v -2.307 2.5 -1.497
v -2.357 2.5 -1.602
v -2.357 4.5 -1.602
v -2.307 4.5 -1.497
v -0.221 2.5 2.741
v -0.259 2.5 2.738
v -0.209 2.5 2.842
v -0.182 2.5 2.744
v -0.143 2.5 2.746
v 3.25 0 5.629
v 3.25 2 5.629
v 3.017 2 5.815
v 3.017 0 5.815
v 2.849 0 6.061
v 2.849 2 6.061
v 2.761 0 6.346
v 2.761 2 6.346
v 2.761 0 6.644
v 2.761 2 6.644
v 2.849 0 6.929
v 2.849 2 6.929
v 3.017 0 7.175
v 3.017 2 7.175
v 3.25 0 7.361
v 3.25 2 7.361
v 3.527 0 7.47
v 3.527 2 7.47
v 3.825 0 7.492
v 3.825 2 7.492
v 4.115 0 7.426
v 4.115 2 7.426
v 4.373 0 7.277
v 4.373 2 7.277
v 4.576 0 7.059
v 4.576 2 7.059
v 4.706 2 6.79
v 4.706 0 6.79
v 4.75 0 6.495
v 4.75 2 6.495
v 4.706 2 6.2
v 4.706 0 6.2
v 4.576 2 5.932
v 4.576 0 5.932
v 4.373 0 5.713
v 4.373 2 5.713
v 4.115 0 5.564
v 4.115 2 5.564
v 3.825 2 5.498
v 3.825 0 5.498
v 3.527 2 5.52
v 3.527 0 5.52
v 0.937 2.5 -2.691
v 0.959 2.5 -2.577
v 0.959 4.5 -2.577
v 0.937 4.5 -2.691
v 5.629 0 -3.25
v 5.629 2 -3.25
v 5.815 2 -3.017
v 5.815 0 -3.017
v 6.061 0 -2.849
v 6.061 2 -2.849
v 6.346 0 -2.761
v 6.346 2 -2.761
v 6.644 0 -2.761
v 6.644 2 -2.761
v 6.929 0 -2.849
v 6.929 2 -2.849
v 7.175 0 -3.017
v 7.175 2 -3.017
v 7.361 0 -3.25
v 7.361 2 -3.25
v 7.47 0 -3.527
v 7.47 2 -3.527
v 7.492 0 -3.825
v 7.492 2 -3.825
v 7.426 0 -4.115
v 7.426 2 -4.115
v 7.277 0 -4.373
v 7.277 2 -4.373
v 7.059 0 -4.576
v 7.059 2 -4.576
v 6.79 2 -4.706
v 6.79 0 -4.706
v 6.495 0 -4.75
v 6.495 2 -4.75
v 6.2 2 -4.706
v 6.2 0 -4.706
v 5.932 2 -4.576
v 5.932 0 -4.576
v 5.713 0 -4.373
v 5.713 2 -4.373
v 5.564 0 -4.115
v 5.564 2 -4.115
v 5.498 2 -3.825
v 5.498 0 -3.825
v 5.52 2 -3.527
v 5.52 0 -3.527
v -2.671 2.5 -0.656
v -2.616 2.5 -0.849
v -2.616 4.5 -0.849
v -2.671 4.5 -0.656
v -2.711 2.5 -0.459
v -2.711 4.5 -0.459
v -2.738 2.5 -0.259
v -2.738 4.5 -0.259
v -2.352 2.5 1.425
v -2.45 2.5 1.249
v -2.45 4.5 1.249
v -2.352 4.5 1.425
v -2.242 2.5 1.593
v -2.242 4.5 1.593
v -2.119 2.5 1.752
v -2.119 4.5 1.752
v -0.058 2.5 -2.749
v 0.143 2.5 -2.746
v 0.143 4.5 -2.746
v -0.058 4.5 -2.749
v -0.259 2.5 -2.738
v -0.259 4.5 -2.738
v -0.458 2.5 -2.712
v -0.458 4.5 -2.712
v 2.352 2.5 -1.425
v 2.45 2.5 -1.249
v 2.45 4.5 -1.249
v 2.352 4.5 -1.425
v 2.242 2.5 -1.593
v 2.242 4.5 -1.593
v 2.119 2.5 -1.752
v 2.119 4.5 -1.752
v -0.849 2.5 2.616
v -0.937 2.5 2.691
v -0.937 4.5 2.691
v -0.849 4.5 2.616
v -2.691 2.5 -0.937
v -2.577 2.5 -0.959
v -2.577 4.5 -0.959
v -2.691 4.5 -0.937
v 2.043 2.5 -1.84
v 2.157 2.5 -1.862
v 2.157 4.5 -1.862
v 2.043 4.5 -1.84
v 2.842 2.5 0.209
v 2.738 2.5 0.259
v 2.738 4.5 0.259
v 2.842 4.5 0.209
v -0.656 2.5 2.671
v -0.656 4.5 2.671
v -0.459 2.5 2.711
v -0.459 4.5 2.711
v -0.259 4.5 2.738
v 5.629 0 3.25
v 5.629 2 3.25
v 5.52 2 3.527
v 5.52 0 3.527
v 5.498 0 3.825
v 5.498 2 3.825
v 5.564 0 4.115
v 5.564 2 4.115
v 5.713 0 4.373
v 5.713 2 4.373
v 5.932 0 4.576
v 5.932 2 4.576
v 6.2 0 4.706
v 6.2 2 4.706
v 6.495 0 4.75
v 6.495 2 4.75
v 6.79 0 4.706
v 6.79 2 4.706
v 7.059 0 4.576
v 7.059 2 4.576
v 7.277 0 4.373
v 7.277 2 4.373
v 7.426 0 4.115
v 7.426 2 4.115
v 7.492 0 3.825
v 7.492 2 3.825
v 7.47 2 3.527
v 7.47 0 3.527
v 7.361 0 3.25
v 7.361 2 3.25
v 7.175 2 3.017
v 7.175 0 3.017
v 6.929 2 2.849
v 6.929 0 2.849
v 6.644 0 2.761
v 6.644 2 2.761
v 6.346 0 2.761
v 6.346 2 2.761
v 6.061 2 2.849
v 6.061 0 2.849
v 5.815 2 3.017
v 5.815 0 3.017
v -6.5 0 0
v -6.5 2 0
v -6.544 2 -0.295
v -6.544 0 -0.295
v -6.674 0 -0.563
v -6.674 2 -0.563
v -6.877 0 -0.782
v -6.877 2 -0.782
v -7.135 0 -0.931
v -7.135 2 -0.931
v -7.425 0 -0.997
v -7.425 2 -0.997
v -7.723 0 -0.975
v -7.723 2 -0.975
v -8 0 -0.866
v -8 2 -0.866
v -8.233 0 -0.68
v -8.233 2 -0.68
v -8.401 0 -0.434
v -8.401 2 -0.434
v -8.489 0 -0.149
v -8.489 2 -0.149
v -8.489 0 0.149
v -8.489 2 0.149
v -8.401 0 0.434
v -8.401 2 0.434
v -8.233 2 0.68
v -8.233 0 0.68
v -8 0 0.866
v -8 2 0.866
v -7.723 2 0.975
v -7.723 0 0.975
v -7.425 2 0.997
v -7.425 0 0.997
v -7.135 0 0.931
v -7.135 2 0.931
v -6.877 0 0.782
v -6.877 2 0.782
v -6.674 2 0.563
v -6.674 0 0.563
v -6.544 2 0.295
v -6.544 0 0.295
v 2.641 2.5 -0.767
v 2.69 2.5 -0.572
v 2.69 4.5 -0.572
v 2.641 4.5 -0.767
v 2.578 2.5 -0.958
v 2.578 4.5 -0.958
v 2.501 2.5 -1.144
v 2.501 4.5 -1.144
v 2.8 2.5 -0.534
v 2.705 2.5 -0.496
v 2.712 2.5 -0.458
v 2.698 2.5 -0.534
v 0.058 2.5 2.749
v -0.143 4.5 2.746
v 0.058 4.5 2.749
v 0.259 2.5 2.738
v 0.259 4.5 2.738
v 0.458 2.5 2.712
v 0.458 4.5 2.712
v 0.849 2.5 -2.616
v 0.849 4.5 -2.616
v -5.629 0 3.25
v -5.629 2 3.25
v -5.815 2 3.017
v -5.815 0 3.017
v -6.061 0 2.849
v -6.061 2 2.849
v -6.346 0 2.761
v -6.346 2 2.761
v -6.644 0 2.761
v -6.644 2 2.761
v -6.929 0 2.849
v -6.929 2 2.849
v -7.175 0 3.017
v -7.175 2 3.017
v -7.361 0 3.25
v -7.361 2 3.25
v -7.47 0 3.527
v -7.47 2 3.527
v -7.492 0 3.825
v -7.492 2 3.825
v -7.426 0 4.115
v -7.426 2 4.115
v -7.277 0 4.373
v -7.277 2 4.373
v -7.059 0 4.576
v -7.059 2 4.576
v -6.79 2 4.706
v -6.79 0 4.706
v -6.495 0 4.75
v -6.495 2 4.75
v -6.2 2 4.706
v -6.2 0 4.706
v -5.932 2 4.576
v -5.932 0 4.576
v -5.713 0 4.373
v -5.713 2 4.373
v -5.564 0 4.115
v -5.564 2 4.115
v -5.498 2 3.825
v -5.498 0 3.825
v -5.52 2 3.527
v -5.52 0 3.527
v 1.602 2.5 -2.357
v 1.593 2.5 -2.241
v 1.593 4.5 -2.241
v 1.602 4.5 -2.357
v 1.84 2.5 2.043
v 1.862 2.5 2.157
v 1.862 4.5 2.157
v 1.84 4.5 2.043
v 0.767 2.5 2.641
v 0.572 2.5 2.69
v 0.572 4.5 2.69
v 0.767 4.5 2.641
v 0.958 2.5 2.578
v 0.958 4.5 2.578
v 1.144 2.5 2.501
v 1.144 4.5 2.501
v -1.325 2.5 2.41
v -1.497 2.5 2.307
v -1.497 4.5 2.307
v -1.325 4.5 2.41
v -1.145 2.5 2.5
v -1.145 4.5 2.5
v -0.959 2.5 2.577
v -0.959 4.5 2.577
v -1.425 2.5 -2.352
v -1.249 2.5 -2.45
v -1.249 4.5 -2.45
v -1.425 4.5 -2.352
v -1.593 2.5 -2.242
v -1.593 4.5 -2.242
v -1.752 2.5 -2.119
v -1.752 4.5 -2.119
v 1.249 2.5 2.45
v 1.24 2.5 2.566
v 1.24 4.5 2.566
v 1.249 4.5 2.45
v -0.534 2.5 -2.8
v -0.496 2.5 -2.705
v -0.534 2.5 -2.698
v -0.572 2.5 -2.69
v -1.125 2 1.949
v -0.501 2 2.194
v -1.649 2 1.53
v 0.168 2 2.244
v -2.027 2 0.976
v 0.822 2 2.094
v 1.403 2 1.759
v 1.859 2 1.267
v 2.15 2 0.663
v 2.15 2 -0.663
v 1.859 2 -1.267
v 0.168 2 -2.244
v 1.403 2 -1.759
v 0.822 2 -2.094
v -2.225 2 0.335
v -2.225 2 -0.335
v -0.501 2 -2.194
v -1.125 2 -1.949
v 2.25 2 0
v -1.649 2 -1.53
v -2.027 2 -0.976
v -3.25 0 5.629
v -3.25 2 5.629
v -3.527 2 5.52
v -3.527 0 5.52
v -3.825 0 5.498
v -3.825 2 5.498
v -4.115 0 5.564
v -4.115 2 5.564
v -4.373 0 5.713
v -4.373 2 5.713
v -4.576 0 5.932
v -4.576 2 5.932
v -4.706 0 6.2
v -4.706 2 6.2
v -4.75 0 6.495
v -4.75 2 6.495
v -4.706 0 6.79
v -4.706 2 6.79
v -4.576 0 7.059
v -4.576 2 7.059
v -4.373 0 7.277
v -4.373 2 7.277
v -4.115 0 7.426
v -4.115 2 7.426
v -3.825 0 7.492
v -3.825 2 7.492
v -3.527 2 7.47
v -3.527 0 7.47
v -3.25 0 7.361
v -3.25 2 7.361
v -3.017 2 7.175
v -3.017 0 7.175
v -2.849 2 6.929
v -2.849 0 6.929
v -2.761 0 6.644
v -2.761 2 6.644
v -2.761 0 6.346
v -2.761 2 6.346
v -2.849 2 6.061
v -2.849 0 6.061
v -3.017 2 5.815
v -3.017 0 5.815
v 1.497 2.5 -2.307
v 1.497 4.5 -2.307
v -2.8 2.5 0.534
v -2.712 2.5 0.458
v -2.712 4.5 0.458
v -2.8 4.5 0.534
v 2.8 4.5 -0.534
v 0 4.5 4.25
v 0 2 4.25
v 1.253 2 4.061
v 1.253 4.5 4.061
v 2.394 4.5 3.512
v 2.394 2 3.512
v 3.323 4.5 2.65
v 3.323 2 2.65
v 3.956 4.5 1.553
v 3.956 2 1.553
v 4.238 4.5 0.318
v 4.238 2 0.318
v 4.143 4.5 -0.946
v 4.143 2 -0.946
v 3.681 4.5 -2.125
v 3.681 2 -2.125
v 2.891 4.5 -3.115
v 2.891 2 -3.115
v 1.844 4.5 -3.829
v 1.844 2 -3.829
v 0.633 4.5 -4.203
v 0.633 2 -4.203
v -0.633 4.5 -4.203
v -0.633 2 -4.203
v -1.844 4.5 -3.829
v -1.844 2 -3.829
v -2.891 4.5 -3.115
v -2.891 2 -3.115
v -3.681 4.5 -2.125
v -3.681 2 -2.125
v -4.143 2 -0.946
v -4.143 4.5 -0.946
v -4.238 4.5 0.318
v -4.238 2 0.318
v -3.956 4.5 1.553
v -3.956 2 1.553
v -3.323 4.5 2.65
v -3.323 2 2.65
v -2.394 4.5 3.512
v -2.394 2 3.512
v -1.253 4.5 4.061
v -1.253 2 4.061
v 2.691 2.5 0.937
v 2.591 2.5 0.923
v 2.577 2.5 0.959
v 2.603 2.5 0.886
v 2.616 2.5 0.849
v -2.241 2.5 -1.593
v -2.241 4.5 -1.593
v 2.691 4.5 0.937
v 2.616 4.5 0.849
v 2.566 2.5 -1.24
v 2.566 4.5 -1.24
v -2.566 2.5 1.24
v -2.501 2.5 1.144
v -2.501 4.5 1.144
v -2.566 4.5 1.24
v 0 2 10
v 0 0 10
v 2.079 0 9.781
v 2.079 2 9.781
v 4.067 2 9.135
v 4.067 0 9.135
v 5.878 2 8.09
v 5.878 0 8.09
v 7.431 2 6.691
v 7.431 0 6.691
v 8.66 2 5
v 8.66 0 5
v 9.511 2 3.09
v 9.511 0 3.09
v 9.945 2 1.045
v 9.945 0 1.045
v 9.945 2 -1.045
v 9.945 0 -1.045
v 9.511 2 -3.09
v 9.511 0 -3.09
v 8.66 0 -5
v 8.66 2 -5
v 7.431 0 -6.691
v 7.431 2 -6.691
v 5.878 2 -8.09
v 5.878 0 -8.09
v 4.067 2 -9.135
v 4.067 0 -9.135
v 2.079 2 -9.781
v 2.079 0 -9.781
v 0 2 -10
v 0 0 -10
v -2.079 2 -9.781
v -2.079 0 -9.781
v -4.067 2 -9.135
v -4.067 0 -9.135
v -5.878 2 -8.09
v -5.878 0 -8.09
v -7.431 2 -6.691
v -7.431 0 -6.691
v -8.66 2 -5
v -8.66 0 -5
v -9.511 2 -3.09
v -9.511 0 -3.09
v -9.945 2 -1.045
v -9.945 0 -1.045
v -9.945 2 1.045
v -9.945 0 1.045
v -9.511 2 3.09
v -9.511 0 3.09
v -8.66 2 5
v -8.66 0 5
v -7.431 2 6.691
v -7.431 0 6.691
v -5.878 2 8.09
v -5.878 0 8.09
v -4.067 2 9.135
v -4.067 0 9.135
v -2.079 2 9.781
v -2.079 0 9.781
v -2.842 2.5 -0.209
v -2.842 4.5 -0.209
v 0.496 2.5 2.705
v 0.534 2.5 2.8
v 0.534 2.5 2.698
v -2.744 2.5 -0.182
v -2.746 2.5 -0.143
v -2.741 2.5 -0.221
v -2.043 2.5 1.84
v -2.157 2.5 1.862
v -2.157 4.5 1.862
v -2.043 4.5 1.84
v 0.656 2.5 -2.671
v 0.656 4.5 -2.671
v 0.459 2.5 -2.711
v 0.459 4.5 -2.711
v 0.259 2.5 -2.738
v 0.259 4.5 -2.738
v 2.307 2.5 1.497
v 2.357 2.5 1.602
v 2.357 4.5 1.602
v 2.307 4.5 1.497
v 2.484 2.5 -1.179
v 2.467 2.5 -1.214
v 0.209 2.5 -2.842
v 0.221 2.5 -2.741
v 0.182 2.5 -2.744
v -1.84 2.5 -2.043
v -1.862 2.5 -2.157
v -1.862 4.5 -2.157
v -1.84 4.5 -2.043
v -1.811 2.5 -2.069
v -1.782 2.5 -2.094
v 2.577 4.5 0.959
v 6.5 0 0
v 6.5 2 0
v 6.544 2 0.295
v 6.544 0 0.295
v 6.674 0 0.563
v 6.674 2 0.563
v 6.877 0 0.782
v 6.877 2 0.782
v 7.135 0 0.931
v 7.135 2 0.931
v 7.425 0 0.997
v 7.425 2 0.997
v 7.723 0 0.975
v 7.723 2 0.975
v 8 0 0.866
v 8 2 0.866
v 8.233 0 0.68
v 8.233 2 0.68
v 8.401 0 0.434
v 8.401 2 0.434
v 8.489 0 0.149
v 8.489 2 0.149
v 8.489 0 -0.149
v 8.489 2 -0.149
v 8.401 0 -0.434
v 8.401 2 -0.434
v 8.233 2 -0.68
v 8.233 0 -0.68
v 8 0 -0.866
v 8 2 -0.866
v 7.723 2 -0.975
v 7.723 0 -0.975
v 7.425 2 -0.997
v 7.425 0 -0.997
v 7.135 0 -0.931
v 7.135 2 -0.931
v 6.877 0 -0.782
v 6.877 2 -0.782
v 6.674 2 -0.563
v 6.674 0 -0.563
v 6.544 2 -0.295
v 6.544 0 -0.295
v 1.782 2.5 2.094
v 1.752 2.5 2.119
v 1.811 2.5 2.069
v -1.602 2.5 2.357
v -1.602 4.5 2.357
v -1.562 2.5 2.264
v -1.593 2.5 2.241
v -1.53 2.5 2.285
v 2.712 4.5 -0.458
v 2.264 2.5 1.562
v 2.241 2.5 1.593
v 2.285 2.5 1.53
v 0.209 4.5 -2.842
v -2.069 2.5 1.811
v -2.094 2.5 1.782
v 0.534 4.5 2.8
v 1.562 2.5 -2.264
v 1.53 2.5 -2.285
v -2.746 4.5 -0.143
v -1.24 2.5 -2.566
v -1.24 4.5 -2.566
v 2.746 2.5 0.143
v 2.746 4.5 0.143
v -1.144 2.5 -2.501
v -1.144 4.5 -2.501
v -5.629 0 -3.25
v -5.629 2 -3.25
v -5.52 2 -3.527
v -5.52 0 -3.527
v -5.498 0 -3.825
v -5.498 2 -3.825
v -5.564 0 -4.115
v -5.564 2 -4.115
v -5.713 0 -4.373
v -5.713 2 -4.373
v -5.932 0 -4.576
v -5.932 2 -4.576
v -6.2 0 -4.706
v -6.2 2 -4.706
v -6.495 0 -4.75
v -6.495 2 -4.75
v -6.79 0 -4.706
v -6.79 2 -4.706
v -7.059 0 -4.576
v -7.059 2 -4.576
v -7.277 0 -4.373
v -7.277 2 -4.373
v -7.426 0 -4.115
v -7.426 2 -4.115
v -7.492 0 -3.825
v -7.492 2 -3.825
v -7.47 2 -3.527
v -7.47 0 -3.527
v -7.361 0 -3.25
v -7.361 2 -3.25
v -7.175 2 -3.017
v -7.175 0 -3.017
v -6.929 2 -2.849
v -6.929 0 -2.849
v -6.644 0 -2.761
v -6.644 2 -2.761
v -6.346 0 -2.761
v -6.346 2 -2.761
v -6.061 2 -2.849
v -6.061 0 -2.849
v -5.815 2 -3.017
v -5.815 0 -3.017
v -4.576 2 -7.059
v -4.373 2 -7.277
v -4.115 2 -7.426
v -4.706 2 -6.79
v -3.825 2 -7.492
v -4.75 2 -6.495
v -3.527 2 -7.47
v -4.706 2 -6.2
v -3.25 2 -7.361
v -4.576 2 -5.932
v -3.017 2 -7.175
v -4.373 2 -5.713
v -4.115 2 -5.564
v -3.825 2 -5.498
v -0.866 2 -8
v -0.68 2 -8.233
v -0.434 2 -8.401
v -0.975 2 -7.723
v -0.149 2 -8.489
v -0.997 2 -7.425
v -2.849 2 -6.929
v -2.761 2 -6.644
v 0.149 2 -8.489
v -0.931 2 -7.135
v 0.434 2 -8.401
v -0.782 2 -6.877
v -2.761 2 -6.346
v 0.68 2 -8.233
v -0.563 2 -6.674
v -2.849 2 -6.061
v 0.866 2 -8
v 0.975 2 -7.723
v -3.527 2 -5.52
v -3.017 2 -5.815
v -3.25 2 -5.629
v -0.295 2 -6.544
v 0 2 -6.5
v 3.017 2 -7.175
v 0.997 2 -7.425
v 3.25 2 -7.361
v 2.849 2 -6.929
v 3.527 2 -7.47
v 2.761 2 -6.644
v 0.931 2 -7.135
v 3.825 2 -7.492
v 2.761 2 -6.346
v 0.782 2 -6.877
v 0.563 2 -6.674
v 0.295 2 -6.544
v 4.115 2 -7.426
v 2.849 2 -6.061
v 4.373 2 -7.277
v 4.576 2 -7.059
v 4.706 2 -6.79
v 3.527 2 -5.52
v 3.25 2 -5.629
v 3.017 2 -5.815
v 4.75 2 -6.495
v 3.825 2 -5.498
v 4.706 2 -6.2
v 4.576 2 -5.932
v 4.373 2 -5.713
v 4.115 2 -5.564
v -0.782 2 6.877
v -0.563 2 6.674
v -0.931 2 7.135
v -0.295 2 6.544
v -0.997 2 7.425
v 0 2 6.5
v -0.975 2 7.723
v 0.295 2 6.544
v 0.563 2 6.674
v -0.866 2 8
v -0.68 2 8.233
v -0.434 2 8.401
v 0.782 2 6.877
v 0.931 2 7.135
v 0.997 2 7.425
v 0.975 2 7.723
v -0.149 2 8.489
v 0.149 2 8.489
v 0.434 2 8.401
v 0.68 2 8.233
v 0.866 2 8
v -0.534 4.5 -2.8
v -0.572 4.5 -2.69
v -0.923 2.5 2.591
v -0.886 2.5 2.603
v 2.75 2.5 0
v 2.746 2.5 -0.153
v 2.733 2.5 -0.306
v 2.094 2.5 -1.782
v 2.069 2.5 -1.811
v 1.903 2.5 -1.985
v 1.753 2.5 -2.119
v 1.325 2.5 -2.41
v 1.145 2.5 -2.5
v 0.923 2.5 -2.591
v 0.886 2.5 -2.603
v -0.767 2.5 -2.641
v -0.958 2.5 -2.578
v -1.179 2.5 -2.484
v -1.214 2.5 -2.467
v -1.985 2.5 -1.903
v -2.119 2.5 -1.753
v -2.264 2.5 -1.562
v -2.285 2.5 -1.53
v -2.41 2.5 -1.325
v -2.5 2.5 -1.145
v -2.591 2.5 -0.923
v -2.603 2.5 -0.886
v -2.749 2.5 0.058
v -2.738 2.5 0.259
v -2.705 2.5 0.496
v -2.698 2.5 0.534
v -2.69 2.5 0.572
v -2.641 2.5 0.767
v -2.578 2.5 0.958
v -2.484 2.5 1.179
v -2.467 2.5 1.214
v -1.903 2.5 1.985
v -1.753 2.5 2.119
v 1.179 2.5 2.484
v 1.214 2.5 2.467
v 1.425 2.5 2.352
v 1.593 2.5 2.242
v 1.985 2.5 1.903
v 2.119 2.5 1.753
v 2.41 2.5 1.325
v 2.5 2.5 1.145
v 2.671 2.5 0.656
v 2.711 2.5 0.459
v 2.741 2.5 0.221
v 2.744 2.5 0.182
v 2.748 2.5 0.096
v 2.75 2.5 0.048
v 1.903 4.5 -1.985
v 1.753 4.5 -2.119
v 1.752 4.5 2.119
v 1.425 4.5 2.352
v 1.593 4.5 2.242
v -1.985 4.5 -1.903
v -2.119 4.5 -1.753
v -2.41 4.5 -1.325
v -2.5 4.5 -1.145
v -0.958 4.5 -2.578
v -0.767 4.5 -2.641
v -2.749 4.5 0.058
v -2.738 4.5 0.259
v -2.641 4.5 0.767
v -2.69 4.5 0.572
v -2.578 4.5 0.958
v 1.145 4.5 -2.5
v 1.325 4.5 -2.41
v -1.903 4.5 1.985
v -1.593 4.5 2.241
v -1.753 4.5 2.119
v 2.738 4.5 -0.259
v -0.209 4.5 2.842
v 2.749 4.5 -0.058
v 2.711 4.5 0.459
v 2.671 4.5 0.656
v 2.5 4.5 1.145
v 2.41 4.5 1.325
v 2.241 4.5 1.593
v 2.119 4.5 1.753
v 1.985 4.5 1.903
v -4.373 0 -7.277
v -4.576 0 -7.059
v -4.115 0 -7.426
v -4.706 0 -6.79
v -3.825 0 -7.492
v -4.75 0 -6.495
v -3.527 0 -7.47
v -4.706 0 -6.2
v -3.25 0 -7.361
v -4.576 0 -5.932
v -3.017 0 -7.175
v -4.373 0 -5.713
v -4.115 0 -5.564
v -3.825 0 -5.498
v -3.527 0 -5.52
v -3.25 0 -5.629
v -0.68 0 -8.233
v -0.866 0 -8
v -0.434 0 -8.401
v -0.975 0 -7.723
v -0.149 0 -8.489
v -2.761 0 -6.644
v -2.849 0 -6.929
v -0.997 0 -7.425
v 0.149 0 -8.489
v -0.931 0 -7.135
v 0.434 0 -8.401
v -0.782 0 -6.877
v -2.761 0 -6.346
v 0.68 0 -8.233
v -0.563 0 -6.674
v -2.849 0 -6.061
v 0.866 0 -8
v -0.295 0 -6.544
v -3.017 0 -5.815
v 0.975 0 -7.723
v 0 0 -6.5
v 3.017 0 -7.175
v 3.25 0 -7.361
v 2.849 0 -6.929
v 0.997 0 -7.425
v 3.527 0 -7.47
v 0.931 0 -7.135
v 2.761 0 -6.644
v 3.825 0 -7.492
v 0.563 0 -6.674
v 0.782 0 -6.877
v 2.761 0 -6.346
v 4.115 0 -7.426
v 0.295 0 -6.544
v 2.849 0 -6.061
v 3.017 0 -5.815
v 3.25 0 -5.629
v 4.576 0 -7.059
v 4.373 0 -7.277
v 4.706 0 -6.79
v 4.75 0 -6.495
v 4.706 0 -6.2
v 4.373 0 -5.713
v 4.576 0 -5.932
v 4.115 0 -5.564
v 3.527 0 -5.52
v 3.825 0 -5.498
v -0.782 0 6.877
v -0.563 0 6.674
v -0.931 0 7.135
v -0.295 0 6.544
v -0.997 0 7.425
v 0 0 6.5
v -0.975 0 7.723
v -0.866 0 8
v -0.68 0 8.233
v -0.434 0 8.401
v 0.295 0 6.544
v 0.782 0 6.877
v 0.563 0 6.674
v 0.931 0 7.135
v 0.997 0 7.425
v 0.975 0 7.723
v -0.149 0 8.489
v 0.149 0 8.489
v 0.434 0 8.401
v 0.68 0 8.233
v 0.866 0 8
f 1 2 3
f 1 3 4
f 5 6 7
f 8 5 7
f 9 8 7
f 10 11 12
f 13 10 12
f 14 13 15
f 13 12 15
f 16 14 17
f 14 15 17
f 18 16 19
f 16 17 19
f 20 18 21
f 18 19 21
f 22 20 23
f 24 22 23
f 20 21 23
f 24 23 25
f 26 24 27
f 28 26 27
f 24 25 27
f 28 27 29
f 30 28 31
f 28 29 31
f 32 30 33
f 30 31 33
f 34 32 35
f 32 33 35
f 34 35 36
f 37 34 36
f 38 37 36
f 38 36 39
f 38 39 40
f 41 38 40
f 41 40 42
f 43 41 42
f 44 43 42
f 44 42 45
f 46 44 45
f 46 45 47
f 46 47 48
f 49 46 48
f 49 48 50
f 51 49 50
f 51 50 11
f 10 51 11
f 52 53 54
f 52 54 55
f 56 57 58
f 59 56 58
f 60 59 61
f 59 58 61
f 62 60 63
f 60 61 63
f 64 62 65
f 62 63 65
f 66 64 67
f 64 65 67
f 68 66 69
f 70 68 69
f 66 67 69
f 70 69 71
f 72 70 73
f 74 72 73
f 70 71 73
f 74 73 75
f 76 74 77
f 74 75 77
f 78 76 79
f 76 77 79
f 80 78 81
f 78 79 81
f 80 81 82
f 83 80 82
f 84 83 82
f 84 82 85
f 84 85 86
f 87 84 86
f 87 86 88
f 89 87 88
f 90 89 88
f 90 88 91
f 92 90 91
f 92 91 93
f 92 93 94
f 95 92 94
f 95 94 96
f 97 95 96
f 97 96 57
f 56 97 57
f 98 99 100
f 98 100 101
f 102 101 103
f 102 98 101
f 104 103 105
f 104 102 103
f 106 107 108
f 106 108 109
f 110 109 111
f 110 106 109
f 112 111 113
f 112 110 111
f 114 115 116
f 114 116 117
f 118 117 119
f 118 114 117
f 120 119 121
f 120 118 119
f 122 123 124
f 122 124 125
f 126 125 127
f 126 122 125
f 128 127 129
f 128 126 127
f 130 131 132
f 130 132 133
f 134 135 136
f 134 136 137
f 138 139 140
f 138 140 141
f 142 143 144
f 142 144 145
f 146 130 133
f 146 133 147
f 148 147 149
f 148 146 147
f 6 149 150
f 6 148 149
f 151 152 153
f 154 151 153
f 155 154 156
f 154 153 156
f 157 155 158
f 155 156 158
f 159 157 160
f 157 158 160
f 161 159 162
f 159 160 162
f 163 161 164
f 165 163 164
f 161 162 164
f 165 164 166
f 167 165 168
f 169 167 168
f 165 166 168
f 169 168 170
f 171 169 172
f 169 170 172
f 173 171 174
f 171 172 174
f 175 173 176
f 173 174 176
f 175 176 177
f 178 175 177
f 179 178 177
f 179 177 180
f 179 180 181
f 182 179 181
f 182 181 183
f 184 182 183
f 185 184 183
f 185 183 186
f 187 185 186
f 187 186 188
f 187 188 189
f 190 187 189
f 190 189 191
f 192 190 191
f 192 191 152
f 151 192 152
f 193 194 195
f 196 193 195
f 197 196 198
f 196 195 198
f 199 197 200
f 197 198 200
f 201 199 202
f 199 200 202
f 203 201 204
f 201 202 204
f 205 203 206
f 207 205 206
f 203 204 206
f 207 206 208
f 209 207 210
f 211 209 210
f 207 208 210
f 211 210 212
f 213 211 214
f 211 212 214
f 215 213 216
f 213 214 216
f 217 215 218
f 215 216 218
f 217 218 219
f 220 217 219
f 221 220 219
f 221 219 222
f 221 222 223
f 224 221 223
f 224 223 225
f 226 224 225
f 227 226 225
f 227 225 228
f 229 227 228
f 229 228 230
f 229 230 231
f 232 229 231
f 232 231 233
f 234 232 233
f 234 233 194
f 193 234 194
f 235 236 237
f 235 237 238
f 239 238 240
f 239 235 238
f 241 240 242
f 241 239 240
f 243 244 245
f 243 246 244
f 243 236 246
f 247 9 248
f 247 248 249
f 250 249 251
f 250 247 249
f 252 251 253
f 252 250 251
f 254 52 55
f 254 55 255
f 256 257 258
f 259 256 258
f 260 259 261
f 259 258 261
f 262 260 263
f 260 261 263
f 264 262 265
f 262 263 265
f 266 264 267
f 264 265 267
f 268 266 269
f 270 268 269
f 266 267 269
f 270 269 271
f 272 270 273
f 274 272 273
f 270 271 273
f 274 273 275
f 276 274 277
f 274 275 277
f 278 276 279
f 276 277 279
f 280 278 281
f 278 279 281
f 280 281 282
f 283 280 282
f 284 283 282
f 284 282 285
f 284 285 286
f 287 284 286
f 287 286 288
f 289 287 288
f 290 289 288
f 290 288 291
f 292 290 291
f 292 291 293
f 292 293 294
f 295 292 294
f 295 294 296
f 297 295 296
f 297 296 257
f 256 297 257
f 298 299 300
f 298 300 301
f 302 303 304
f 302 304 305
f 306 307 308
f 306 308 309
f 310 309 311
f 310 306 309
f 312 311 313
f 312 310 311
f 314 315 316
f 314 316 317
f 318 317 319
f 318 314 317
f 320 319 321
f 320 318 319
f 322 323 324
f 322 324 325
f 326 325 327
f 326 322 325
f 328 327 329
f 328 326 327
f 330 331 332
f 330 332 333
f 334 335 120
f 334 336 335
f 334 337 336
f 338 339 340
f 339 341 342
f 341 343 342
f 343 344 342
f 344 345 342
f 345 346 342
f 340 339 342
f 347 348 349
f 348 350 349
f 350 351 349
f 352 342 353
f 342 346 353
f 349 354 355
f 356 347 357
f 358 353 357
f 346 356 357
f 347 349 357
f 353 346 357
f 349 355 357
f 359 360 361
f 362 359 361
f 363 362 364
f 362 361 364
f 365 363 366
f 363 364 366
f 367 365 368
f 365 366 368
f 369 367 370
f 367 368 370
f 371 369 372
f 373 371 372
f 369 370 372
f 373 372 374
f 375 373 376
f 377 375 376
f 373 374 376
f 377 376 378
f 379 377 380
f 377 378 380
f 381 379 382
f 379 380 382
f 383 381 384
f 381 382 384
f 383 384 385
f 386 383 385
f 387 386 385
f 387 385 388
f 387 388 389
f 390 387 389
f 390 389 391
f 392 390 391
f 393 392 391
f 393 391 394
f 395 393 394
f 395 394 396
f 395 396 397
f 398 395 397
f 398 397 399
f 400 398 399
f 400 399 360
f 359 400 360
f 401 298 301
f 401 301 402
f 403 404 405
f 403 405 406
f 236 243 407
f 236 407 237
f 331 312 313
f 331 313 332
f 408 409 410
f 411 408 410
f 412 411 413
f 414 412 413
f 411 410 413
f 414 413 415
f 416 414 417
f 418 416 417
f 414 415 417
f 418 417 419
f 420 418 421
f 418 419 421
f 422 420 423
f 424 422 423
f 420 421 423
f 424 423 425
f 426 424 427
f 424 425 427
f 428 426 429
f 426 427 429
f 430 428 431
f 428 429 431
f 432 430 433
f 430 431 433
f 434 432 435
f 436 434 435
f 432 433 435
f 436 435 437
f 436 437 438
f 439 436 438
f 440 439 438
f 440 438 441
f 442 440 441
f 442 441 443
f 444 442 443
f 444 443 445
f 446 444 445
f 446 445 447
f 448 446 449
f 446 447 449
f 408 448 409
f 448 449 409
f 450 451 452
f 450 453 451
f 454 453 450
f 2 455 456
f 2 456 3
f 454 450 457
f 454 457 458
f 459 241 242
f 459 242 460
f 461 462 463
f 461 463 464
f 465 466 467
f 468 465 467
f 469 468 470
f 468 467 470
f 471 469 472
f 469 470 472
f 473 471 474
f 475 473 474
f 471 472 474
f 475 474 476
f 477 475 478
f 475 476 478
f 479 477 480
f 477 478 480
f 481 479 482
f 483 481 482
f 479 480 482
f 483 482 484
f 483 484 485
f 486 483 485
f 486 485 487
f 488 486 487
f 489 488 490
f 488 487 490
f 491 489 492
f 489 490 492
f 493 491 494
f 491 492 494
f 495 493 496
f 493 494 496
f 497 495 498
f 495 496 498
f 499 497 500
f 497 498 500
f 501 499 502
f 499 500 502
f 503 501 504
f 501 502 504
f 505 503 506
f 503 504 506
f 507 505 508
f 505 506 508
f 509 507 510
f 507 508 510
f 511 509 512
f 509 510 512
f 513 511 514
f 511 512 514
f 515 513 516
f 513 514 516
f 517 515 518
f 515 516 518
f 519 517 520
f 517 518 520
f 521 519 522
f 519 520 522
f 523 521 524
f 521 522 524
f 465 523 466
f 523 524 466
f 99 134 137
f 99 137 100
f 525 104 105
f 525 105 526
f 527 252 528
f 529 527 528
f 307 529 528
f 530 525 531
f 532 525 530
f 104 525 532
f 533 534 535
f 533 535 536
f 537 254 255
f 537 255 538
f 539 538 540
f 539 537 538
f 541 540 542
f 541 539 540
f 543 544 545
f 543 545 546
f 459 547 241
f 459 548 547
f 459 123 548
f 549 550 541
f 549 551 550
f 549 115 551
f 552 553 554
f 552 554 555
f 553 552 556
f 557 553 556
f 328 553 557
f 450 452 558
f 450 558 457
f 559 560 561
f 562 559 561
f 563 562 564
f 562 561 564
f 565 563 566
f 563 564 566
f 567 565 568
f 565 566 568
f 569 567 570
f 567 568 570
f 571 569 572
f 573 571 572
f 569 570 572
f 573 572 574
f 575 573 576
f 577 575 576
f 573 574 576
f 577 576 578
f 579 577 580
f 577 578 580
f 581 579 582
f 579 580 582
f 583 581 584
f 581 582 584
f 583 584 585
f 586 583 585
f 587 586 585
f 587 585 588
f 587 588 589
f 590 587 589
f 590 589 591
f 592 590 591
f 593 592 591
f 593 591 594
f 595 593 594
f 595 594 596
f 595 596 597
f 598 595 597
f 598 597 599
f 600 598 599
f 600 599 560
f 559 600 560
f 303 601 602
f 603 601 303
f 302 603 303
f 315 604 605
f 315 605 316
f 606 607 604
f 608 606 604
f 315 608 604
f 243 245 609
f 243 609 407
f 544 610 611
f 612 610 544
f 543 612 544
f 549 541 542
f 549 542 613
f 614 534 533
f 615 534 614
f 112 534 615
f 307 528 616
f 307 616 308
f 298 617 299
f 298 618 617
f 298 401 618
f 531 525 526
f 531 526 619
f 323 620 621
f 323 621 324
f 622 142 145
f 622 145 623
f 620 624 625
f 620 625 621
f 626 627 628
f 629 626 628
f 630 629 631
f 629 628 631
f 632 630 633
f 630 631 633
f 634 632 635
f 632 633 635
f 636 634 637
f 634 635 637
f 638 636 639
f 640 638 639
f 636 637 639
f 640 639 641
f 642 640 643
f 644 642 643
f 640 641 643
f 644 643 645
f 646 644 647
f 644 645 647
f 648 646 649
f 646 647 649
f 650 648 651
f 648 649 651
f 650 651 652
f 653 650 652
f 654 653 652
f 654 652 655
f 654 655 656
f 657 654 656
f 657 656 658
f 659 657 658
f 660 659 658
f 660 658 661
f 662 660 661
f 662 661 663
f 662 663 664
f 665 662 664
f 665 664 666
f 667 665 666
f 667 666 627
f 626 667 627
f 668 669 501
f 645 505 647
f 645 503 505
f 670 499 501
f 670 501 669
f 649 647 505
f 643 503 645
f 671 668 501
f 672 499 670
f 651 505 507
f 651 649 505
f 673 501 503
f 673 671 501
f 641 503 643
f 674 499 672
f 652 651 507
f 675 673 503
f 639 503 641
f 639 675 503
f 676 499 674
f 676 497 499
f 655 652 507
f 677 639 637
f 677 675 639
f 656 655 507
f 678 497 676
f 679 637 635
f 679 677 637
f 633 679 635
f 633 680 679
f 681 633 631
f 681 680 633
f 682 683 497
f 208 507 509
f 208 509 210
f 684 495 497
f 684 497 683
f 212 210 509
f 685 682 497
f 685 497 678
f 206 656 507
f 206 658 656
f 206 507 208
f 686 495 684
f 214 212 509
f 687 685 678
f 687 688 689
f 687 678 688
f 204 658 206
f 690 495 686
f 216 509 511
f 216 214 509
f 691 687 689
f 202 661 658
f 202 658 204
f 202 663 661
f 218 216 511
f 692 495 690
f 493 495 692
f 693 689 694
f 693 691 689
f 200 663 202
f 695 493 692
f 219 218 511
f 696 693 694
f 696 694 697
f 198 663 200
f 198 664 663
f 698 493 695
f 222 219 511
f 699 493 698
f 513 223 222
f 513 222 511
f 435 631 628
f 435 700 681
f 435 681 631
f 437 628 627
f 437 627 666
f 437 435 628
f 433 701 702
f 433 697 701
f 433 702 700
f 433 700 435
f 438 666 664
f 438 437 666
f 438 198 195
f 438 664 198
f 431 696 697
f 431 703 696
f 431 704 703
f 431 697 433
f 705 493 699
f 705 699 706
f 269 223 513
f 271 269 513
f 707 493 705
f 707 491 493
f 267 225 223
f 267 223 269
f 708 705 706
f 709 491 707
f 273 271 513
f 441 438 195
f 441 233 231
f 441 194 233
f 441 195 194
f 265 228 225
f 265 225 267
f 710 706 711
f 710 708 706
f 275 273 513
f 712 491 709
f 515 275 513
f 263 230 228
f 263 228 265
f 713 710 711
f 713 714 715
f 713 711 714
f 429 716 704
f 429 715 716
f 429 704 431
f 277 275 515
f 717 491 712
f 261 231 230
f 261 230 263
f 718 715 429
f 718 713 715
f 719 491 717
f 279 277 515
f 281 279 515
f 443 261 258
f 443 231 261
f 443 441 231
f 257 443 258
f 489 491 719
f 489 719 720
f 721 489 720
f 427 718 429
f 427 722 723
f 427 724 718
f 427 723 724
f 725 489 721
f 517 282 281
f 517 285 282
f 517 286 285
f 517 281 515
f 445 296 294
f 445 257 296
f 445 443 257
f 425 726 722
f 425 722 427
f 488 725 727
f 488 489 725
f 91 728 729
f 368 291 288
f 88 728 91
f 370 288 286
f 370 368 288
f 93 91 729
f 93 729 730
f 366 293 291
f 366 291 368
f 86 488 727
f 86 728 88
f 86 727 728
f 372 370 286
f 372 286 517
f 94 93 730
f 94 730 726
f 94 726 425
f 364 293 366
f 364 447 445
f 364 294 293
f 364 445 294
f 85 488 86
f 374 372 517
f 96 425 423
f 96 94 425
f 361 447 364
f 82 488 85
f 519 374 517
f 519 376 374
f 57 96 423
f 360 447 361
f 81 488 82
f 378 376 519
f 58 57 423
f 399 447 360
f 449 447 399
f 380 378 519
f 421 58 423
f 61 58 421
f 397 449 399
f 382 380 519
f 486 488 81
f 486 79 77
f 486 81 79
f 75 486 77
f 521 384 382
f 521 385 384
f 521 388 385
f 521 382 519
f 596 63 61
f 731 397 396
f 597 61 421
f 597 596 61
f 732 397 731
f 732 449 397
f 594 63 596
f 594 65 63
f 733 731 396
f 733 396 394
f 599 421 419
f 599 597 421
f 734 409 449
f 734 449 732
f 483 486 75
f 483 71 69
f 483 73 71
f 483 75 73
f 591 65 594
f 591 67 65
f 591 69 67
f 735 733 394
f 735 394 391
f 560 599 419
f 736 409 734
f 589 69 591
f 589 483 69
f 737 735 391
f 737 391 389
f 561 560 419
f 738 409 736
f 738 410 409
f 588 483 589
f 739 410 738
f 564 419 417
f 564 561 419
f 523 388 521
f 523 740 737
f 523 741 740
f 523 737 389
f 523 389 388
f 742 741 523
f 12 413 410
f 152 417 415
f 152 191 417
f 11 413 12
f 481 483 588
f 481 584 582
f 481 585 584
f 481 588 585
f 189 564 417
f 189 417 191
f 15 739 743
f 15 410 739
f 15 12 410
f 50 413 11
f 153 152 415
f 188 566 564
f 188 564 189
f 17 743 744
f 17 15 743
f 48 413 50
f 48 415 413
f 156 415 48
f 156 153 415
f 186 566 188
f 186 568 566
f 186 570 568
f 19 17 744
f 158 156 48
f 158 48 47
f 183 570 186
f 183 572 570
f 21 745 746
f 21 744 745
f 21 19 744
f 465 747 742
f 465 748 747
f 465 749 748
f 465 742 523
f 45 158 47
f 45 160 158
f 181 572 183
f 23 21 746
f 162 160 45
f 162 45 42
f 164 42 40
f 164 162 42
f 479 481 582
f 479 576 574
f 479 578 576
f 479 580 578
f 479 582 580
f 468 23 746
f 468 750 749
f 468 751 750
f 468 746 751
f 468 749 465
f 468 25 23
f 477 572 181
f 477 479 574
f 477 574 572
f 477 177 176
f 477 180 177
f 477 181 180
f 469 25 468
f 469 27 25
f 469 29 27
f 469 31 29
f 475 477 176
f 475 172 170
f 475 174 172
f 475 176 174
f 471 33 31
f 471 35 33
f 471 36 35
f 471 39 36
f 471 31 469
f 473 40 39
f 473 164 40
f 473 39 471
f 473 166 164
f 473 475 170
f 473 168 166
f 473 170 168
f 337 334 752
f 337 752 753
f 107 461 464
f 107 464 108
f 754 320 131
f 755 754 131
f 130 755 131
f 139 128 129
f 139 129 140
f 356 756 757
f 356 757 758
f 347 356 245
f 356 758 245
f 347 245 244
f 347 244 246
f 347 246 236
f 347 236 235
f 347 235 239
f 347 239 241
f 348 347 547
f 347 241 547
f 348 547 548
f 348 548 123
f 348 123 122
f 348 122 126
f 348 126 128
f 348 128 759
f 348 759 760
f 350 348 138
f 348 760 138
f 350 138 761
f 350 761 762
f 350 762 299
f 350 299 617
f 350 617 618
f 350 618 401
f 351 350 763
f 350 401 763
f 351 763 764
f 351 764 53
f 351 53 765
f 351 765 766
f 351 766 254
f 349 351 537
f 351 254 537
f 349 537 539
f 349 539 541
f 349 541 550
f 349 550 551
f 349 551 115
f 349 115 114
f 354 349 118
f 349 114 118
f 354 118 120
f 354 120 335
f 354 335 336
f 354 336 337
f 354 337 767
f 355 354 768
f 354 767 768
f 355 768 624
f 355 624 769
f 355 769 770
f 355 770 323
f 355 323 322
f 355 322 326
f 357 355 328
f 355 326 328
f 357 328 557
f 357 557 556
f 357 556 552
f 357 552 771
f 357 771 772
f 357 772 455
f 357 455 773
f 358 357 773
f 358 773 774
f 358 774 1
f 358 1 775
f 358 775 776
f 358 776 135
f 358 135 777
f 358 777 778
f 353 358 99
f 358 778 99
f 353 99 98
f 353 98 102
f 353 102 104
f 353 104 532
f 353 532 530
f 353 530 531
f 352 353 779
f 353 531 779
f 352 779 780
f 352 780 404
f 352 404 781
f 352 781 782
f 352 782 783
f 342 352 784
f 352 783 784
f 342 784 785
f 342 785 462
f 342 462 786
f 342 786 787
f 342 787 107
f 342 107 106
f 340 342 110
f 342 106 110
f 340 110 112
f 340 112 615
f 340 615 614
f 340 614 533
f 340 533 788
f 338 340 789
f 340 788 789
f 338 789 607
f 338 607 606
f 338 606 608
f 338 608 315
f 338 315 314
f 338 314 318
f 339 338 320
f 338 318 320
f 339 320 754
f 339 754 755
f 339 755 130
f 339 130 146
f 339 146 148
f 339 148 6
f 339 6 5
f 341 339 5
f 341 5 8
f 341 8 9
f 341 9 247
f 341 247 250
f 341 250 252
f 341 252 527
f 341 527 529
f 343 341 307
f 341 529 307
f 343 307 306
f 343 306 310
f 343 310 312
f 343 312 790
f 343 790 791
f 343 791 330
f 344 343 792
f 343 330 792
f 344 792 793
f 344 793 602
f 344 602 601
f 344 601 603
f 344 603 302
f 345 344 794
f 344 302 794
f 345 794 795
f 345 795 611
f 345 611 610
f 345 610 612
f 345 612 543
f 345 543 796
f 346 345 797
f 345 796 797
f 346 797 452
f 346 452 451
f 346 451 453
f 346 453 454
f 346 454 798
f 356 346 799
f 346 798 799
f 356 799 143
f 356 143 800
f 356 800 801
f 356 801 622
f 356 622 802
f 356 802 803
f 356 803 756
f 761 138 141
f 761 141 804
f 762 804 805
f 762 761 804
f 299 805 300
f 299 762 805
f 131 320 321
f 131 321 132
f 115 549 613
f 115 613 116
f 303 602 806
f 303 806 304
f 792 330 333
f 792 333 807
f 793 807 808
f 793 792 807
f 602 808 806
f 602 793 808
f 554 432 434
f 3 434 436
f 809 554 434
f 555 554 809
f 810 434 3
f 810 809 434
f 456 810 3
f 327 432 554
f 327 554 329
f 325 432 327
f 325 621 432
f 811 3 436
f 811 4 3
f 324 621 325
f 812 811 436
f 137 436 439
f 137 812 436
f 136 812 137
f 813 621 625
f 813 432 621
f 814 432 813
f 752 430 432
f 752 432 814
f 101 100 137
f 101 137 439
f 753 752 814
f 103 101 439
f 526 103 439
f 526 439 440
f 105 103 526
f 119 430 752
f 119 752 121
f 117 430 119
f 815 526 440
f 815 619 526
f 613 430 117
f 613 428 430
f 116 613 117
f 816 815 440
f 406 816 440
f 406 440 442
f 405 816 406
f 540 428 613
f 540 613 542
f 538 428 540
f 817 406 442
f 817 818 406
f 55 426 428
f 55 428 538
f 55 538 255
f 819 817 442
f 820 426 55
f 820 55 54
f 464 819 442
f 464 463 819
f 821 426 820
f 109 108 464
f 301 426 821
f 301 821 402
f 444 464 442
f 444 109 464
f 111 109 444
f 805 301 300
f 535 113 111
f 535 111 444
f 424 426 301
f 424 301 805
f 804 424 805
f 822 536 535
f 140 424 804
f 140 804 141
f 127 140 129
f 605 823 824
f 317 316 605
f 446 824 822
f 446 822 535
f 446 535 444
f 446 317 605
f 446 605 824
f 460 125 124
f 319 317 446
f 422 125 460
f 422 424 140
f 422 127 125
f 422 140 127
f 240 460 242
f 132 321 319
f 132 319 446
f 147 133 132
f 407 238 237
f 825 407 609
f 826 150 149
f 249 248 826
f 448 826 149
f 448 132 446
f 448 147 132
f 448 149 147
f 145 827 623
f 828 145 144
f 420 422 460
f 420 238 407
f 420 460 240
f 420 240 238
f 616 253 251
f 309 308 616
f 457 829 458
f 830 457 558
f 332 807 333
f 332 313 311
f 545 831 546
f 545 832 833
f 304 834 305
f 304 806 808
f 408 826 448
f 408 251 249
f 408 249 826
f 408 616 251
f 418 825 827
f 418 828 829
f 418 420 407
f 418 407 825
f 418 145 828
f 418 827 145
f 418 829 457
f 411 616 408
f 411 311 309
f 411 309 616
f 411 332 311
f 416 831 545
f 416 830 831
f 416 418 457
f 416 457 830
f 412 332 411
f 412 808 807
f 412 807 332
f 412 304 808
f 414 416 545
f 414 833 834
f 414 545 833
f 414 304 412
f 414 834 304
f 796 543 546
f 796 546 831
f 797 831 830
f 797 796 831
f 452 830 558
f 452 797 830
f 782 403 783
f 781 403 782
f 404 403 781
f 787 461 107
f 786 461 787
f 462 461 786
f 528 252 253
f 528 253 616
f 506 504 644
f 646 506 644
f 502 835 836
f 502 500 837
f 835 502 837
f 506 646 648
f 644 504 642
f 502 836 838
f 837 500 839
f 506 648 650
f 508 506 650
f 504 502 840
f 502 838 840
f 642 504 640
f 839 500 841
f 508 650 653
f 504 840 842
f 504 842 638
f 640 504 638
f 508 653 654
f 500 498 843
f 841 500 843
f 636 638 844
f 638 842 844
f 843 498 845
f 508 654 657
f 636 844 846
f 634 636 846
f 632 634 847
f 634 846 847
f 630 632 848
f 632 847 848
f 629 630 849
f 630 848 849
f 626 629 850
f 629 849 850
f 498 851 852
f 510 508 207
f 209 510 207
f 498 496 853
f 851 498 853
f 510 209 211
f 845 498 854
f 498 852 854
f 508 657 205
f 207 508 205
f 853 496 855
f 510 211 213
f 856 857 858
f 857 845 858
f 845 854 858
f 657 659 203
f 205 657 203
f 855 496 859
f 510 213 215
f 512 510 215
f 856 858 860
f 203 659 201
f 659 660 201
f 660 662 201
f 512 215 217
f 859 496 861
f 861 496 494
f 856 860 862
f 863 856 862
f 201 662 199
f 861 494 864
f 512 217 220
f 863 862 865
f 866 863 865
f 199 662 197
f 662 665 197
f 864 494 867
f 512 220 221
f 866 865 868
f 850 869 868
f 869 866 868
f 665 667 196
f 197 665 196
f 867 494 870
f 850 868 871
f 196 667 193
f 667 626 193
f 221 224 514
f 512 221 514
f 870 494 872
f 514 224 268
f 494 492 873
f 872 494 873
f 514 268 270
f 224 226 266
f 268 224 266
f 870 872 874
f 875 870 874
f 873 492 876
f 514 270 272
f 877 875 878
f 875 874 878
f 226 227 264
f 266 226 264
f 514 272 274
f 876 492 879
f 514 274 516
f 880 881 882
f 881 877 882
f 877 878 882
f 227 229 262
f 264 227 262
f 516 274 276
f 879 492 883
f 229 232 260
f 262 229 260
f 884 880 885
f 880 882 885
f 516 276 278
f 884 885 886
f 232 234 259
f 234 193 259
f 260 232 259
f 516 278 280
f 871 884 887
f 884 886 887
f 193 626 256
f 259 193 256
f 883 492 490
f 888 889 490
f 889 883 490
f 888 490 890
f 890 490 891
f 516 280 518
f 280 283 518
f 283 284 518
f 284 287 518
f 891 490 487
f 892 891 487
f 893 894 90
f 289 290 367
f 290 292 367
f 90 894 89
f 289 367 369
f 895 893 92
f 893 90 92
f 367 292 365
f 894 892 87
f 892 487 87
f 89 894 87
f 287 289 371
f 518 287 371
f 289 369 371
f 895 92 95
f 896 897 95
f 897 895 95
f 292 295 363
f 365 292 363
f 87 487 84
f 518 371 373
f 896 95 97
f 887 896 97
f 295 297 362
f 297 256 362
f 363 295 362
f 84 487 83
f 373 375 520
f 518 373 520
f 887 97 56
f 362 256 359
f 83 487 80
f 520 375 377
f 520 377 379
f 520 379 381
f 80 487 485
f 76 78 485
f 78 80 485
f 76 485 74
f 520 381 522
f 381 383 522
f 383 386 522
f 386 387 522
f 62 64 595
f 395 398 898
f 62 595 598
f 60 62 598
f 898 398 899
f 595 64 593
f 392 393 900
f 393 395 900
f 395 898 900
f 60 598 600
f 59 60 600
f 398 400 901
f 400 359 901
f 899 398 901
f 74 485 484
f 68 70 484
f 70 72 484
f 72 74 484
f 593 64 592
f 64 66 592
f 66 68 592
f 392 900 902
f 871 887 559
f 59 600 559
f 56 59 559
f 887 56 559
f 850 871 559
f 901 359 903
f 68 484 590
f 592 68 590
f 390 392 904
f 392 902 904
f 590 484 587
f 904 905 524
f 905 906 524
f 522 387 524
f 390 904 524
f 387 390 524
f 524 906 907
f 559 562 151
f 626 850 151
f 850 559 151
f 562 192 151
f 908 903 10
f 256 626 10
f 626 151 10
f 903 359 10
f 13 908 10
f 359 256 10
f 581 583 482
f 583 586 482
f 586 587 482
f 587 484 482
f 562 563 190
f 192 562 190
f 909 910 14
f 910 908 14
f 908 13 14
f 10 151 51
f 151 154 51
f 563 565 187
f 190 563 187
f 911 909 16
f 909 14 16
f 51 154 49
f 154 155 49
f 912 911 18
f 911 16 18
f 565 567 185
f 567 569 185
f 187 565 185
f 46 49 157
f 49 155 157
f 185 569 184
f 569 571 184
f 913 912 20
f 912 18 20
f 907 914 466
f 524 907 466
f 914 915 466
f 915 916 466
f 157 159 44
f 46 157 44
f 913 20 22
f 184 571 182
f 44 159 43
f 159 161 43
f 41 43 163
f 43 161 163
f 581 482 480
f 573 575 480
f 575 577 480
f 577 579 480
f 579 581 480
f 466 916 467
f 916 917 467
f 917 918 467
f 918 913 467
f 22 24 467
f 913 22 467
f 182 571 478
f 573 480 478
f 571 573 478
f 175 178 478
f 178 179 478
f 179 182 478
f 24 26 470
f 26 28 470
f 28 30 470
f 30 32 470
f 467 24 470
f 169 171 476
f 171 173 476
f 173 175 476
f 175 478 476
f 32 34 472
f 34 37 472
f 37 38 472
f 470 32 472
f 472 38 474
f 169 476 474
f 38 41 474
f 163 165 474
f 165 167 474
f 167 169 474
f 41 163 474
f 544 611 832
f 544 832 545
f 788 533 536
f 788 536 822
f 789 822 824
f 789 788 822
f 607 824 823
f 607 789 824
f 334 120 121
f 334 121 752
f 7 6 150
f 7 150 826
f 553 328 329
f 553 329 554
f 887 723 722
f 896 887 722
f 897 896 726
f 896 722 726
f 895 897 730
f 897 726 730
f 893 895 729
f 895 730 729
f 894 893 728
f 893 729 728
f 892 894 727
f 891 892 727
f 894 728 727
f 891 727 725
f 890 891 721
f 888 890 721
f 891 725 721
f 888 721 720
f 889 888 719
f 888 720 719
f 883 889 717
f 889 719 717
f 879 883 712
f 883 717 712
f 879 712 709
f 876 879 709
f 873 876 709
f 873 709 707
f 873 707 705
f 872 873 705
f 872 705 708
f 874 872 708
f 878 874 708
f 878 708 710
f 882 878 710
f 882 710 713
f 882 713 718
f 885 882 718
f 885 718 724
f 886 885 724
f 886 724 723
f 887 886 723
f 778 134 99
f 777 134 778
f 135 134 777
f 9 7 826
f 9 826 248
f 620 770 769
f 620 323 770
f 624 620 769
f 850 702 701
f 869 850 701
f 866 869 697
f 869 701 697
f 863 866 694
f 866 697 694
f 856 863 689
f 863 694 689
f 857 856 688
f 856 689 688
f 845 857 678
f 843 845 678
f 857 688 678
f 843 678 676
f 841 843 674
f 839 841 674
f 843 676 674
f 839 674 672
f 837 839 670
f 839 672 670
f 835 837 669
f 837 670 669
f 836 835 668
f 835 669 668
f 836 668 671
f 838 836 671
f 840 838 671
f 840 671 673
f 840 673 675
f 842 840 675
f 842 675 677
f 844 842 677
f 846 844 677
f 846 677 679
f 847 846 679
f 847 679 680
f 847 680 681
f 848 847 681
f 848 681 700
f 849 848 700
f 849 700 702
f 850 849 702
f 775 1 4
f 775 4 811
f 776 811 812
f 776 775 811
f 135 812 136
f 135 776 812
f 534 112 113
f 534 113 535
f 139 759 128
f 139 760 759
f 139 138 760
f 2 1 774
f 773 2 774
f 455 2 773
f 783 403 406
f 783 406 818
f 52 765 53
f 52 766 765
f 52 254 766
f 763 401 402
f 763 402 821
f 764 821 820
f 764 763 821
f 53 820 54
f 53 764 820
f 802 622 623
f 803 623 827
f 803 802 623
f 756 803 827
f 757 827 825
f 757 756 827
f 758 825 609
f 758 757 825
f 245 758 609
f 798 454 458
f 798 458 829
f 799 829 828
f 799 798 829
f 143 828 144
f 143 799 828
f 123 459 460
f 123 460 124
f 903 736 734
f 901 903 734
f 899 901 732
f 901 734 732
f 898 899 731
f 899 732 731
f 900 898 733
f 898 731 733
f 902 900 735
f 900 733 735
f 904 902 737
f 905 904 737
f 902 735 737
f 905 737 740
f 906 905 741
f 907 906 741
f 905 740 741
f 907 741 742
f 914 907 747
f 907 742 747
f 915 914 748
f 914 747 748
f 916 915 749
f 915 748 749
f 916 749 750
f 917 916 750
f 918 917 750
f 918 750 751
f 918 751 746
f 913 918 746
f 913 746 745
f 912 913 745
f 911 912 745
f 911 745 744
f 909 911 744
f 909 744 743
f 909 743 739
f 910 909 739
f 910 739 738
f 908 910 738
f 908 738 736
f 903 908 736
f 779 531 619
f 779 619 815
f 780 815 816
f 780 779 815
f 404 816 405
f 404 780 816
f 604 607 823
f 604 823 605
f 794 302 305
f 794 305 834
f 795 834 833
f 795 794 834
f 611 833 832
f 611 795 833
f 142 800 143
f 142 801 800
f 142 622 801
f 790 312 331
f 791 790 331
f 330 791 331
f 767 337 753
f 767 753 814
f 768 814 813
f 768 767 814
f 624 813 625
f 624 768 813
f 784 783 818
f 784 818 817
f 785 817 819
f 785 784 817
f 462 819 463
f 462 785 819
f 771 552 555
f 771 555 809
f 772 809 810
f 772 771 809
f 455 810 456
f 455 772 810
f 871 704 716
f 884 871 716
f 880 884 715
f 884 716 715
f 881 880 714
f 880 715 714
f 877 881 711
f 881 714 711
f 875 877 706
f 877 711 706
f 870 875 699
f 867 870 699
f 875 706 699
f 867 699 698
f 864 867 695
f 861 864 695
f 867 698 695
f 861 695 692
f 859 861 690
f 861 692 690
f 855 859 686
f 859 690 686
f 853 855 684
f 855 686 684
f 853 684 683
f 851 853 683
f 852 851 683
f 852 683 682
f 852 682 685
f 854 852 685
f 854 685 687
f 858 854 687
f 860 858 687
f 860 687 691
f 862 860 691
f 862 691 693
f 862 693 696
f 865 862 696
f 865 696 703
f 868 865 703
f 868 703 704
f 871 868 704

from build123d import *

# Parameters (mm, degrees)
SKETCH1_R           = 10
BOSS_EXTRUDE1_DEPTH = 2
SKETCH2_R           = 4.25
BOSS_EXTRUDE2_DEPTH = 2.5
CAVITY4_START       = 2.5
CAVITY4_DEPTH       = 2
SKETCH3_R           = 1
CUT_EXTRUDE1_DEPTH  = 15.361406616
CIRPATTERN1_COUNT   = 12


with BuildPart() as part:
    # Sketch1 → Boss-Extrude1 (new body)
    with BuildSketch(Plane(origin=(0, 0, 0), x_dir=(1, 0, 0), z_dir=(0, 1, 0))):
        with Locations(Location((0, 0, 0), (0, 0, 270))):
            Circle(SKETCH1_R)
    extrude(amount=BOSS_EXTRUDE1_DEPTH)

    # Sketch2 → Boss-Extrude2 (add)
    with BuildSketch(Plane(origin=(0, 2, 0), x_dir=(1, 0, 0), z_dir=(0, 1, 0))):
        with Locations(Location((0, 0, 0), (0, 0, 270))):
            Circle(SKETCH2_R)
    extrude(amount=BOSS_EXTRUDE2_DEPTH)

    # Cavity4: read off the stored shape, not the designer's step
    # Cavity4 outline → Cavity4 (cut)
    with BuildSketch(Plane(origin=(0, 0, 0), x_dir=(1, 0, 0), z_dir=(0, 1, 0)).offset(CAVITY4_START)):
        with BuildLine():
            Line((-0.937311647, -2.691458132), (-0.849363871, -2.615546026))
            ThreePointArc((-0.849363871, -2.615546026), (-0.557706787, -2.692854088), (-0.259335807, -2.737744498))
            Line((-0.259335807, -2.737744498), (-0.208772903, -2.842343026))
            Line((-0.208772903, -2.842343026), (-0.143469374, -2.746255003))
            ThreePointArc((-0.143469374, -2.746255003), (0.158258534, -2.745442448), (0.458081263, -2.711579163))
            Line((0.458081263, -2.711579163), (0.533993369, -2.799526939))
            Line((0.533993369, -2.799526939), (0.572202324, -2.689811239))
            ThreePointArc((0.572202324, -2.689811239), (0.863438798, -2.610933443), (1.144280852, -2.500624188))
            Line((1.144280852, -2.500624188), (1.240368875, -2.565927718))
            Line((1.240368875, -2.565927718), (1.248879379, -2.450061284))
            ThreePointArc((1.248879379, -2.450061284), (1.509777135, -2.298493638), (1.752499592, -2.119255808))
            Line((1.752499592, -2.119255808), (1.862215292, -2.157464763))
            Line((1.862215292, -2.157464763), (1.840447368, -2.043343702))
            ThreePointArc((1.840447368, -2.043343702), (2.053226655, -1.82941529), (2.241288381, -1.593463647))
            Line((2.241288381, -1.593463647), (2.357154815, -1.601974151))
            Line((2.357154815, -1.601974151), (2.306591911, -1.497375623))
            ThreePointArc((2.306591911, -1.497375623), (2.456752172, -1.235665313), (2.577337071, -0.959079571))
            Line((2.577337071, -0.959079571), (2.691458132, -0.937311647))
            Line((2.691458132, -0.937311647), (2.615546026, -0.849363871))
            ThreePointArc((2.615546026, -0.849363871), (2.692854088, -0.557706787), (2.737744498, -0.259335807))
            Line((2.737744498, -0.259335807), (2.842343026, -0.208772903))
            Line((2.842343026, -0.208772903), (2.746255003, -0.143469374))
            ThreePointArc((2.746255003, -0.143469374), (2.745442448, 0.158258534), (2.711579163, 0.458081263))
            Line((2.711579163, 0.458081263), (2.799526939, 0.533993369))
            Line((2.799526939, 0.533993369), (2.689811239, 0.572202324))
            ThreePointArc((2.689811239, 0.572202324), (2.610933443, 0.863438798), (2.500624188, 1.144280852))
            Line((2.500624188, 1.144280852), (2.565927718, 1.240368875))
            Line((2.565927718, 1.240368875), (2.450061284, 1.248879379))
            ThreePointArc((2.450061284, 1.248879379), (2.298493638, 1.509777135), (2.119255808, 1.752499592))
            Line((2.119255808, 1.752499592), (2.157464763, 1.862215292))
            Line((2.157464763, 1.862215292), (2.043343702, 1.840447368))
            ThreePointArc((2.043343702, 1.840447368), (1.82941529, 2.053226655), (1.593463647, 2.241288381))
            Line((1.593463647, 2.241288381), (1.601974151, 2.357154815))
            Line((1.601974151, 2.357154815), (1.497375623, 2.306591911))
            ThreePointArc((1.497375623, 2.306591911), (1.235665313, 2.456752172), (0.959079571, 2.577337071))
            Line((0.959079571, 2.577337071), (0.937311647, 2.691458132))
            Line((0.937311647, 2.691458132), (0.849363871, 2.615546026))
            ThreePointArc((0.849363871, 2.615546026), (0.557706787, 2.692854088), (0.259335807, 2.737744498))
            Line((0.259335807, 2.737744498), (0.208772903, 2.842343026))
            Line((0.208772903, 2.842343026), (0.143469374, 2.746255003))
            ThreePointArc((0.143469374, 2.746255003), (-0.158258534, 2.745442448), (-0.458081263, 2.711579163))
            Line((-0.458081263, 2.711579163), (-0.533993369, 2.799526939))
            Line((-0.533993369, 2.799526939), (-0.572202324, 2.689811239))
            ThreePointArc((-0.572202324, 2.689811239), (-0.863438798, 2.610933443), (-1.144280852, 2.500624188))
            Line((-1.144280852, 2.500624188), (-1.240368875, 2.565927718))
            Line((-1.240368875, 2.565927718), (-1.248879379, 2.450061284))
            ThreePointArc((-1.248879379, 2.450061284), (-1.509777135, 2.298493638), (-1.752499592, 2.119255808))
            Line((-1.752499592, 2.119255808), (-1.862215292, 2.157464763))
            Line((-1.862215292, 2.157464763), (-1.840447368, 2.043343702))
            ThreePointArc((-1.840447368, 2.043343702), (-2.053226655, 1.82941529), (-2.241288381, 1.593463647))
            Line((-2.241288381, 1.593463647), (-2.357154815, 1.601974151))
            Line((-2.357154815, 1.601974151), (-2.306591911, 1.497375623))
            ThreePointArc((-2.306591911, 1.497375623), (-2.456752172, 1.235665313), (-2.577337071, 0.959079571))
            Line((-2.577337071, 0.959079571), (-2.691458132, 0.937311647))
            Line((-2.691458132, 0.937311647), (-2.615546026, 0.849363871))
            ThreePointArc((-2.615546026, 0.849363871), (-2.692854088, 0.557706787), (-2.737744498, 0.259335807))
            Line((-2.737744498, 0.259335807), (-2.842343026, 0.208772903))
            Line((-2.842343026, 0.208772903), (-2.746255003, 0.143469374))
            ThreePointArc((-2.746255003, 0.143469374), (-2.745442448, -0.158258534), (-2.711579163, -0.458081263))
            Line((-2.711579163, -0.458081263), (-2.799526939, -0.533993369))
            Line((-2.799526939, -0.533993369), (-2.689811239, -0.572202324))
            ThreePointArc((-2.689811239, -0.572202324), (-2.610933443, -0.863438798), (-2.500624188, -1.144280852))
            Line((-2.500624188, -1.144280852), (-2.565927718, -1.240368875))
            Line((-2.565927718, -1.240368875), (-2.450061284, -1.248879379))
            ThreePointArc((-2.450061284, -1.248879379), (-2.298493638, -1.509777135), (-2.119255808, -1.752499592))
            Line((-2.119255808, -1.752499592), (-2.157464763, -1.862215292))
            Line((-2.157464763, -1.862215292), (-2.043343702, -1.840447368))
            ThreePointArc((-2.043343702, -1.840447368), (-1.82941529, -2.053226655), (-1.593463647, -2.241288381))
            Line((-1.593463647, -2.241288381), (-1.601974151, -2.357154815))
            Line((-1.601974151, -2.357154815), (-1.497375623, -2.306591911))
            ThreePointArc((-1.497375623, -2.306591911), (-1.235665313, -2.456752172), (-0.959079571, -2.577337071))
            Line((-0.959079571, -2.577337071), (-0.937311647, -2.691458132))
        make_face()
    extrude(amount=CAVITY4_DEPTH, mode=Mode.SUBTRACT)

    # Cavity4 2 outline → Cavity4 2 (revolve, cut)
    with BuildSketch(Plane.XY):
        Polygon((0, 2.5), (0, 2), (2.25, 2), (2.75, 2.5), align=None)
    revolve(axis=Axis((0, 0, 0), (0, 1, 0)), mode=Mode.SUBTRACT)

    # Sketch3 → Cut-Extrude1 (cut, through all)
    with BuildSketch(Plane(origin=(0, 2, 0), x_dir=(1, 0, 0), z_dir=(0, 1, 0))):
        with Locations(Location((0, 7.5, 0), (0, 0, 270))):
            Circle(SKETCH3_R)
    cut_extrude1 = extrude(amount=-CUT_EXTRUDE1_DEPTH, mode=Mode.SUBTRACT)

    # CirPattern1: Cut-Extrude1 ×12 about axis
    cirpattern1_axis = Axis((0, 0, 0), (0, 1, 0))
    for i in range(1, CIRPATTERN1_COUNT):
        add(cut_extrude1.rotate(cirpattern1_axis, i * 360 / CIRPATTERN1_COUNT), mode=Mode.SUBTRACT)


solid = part.part
